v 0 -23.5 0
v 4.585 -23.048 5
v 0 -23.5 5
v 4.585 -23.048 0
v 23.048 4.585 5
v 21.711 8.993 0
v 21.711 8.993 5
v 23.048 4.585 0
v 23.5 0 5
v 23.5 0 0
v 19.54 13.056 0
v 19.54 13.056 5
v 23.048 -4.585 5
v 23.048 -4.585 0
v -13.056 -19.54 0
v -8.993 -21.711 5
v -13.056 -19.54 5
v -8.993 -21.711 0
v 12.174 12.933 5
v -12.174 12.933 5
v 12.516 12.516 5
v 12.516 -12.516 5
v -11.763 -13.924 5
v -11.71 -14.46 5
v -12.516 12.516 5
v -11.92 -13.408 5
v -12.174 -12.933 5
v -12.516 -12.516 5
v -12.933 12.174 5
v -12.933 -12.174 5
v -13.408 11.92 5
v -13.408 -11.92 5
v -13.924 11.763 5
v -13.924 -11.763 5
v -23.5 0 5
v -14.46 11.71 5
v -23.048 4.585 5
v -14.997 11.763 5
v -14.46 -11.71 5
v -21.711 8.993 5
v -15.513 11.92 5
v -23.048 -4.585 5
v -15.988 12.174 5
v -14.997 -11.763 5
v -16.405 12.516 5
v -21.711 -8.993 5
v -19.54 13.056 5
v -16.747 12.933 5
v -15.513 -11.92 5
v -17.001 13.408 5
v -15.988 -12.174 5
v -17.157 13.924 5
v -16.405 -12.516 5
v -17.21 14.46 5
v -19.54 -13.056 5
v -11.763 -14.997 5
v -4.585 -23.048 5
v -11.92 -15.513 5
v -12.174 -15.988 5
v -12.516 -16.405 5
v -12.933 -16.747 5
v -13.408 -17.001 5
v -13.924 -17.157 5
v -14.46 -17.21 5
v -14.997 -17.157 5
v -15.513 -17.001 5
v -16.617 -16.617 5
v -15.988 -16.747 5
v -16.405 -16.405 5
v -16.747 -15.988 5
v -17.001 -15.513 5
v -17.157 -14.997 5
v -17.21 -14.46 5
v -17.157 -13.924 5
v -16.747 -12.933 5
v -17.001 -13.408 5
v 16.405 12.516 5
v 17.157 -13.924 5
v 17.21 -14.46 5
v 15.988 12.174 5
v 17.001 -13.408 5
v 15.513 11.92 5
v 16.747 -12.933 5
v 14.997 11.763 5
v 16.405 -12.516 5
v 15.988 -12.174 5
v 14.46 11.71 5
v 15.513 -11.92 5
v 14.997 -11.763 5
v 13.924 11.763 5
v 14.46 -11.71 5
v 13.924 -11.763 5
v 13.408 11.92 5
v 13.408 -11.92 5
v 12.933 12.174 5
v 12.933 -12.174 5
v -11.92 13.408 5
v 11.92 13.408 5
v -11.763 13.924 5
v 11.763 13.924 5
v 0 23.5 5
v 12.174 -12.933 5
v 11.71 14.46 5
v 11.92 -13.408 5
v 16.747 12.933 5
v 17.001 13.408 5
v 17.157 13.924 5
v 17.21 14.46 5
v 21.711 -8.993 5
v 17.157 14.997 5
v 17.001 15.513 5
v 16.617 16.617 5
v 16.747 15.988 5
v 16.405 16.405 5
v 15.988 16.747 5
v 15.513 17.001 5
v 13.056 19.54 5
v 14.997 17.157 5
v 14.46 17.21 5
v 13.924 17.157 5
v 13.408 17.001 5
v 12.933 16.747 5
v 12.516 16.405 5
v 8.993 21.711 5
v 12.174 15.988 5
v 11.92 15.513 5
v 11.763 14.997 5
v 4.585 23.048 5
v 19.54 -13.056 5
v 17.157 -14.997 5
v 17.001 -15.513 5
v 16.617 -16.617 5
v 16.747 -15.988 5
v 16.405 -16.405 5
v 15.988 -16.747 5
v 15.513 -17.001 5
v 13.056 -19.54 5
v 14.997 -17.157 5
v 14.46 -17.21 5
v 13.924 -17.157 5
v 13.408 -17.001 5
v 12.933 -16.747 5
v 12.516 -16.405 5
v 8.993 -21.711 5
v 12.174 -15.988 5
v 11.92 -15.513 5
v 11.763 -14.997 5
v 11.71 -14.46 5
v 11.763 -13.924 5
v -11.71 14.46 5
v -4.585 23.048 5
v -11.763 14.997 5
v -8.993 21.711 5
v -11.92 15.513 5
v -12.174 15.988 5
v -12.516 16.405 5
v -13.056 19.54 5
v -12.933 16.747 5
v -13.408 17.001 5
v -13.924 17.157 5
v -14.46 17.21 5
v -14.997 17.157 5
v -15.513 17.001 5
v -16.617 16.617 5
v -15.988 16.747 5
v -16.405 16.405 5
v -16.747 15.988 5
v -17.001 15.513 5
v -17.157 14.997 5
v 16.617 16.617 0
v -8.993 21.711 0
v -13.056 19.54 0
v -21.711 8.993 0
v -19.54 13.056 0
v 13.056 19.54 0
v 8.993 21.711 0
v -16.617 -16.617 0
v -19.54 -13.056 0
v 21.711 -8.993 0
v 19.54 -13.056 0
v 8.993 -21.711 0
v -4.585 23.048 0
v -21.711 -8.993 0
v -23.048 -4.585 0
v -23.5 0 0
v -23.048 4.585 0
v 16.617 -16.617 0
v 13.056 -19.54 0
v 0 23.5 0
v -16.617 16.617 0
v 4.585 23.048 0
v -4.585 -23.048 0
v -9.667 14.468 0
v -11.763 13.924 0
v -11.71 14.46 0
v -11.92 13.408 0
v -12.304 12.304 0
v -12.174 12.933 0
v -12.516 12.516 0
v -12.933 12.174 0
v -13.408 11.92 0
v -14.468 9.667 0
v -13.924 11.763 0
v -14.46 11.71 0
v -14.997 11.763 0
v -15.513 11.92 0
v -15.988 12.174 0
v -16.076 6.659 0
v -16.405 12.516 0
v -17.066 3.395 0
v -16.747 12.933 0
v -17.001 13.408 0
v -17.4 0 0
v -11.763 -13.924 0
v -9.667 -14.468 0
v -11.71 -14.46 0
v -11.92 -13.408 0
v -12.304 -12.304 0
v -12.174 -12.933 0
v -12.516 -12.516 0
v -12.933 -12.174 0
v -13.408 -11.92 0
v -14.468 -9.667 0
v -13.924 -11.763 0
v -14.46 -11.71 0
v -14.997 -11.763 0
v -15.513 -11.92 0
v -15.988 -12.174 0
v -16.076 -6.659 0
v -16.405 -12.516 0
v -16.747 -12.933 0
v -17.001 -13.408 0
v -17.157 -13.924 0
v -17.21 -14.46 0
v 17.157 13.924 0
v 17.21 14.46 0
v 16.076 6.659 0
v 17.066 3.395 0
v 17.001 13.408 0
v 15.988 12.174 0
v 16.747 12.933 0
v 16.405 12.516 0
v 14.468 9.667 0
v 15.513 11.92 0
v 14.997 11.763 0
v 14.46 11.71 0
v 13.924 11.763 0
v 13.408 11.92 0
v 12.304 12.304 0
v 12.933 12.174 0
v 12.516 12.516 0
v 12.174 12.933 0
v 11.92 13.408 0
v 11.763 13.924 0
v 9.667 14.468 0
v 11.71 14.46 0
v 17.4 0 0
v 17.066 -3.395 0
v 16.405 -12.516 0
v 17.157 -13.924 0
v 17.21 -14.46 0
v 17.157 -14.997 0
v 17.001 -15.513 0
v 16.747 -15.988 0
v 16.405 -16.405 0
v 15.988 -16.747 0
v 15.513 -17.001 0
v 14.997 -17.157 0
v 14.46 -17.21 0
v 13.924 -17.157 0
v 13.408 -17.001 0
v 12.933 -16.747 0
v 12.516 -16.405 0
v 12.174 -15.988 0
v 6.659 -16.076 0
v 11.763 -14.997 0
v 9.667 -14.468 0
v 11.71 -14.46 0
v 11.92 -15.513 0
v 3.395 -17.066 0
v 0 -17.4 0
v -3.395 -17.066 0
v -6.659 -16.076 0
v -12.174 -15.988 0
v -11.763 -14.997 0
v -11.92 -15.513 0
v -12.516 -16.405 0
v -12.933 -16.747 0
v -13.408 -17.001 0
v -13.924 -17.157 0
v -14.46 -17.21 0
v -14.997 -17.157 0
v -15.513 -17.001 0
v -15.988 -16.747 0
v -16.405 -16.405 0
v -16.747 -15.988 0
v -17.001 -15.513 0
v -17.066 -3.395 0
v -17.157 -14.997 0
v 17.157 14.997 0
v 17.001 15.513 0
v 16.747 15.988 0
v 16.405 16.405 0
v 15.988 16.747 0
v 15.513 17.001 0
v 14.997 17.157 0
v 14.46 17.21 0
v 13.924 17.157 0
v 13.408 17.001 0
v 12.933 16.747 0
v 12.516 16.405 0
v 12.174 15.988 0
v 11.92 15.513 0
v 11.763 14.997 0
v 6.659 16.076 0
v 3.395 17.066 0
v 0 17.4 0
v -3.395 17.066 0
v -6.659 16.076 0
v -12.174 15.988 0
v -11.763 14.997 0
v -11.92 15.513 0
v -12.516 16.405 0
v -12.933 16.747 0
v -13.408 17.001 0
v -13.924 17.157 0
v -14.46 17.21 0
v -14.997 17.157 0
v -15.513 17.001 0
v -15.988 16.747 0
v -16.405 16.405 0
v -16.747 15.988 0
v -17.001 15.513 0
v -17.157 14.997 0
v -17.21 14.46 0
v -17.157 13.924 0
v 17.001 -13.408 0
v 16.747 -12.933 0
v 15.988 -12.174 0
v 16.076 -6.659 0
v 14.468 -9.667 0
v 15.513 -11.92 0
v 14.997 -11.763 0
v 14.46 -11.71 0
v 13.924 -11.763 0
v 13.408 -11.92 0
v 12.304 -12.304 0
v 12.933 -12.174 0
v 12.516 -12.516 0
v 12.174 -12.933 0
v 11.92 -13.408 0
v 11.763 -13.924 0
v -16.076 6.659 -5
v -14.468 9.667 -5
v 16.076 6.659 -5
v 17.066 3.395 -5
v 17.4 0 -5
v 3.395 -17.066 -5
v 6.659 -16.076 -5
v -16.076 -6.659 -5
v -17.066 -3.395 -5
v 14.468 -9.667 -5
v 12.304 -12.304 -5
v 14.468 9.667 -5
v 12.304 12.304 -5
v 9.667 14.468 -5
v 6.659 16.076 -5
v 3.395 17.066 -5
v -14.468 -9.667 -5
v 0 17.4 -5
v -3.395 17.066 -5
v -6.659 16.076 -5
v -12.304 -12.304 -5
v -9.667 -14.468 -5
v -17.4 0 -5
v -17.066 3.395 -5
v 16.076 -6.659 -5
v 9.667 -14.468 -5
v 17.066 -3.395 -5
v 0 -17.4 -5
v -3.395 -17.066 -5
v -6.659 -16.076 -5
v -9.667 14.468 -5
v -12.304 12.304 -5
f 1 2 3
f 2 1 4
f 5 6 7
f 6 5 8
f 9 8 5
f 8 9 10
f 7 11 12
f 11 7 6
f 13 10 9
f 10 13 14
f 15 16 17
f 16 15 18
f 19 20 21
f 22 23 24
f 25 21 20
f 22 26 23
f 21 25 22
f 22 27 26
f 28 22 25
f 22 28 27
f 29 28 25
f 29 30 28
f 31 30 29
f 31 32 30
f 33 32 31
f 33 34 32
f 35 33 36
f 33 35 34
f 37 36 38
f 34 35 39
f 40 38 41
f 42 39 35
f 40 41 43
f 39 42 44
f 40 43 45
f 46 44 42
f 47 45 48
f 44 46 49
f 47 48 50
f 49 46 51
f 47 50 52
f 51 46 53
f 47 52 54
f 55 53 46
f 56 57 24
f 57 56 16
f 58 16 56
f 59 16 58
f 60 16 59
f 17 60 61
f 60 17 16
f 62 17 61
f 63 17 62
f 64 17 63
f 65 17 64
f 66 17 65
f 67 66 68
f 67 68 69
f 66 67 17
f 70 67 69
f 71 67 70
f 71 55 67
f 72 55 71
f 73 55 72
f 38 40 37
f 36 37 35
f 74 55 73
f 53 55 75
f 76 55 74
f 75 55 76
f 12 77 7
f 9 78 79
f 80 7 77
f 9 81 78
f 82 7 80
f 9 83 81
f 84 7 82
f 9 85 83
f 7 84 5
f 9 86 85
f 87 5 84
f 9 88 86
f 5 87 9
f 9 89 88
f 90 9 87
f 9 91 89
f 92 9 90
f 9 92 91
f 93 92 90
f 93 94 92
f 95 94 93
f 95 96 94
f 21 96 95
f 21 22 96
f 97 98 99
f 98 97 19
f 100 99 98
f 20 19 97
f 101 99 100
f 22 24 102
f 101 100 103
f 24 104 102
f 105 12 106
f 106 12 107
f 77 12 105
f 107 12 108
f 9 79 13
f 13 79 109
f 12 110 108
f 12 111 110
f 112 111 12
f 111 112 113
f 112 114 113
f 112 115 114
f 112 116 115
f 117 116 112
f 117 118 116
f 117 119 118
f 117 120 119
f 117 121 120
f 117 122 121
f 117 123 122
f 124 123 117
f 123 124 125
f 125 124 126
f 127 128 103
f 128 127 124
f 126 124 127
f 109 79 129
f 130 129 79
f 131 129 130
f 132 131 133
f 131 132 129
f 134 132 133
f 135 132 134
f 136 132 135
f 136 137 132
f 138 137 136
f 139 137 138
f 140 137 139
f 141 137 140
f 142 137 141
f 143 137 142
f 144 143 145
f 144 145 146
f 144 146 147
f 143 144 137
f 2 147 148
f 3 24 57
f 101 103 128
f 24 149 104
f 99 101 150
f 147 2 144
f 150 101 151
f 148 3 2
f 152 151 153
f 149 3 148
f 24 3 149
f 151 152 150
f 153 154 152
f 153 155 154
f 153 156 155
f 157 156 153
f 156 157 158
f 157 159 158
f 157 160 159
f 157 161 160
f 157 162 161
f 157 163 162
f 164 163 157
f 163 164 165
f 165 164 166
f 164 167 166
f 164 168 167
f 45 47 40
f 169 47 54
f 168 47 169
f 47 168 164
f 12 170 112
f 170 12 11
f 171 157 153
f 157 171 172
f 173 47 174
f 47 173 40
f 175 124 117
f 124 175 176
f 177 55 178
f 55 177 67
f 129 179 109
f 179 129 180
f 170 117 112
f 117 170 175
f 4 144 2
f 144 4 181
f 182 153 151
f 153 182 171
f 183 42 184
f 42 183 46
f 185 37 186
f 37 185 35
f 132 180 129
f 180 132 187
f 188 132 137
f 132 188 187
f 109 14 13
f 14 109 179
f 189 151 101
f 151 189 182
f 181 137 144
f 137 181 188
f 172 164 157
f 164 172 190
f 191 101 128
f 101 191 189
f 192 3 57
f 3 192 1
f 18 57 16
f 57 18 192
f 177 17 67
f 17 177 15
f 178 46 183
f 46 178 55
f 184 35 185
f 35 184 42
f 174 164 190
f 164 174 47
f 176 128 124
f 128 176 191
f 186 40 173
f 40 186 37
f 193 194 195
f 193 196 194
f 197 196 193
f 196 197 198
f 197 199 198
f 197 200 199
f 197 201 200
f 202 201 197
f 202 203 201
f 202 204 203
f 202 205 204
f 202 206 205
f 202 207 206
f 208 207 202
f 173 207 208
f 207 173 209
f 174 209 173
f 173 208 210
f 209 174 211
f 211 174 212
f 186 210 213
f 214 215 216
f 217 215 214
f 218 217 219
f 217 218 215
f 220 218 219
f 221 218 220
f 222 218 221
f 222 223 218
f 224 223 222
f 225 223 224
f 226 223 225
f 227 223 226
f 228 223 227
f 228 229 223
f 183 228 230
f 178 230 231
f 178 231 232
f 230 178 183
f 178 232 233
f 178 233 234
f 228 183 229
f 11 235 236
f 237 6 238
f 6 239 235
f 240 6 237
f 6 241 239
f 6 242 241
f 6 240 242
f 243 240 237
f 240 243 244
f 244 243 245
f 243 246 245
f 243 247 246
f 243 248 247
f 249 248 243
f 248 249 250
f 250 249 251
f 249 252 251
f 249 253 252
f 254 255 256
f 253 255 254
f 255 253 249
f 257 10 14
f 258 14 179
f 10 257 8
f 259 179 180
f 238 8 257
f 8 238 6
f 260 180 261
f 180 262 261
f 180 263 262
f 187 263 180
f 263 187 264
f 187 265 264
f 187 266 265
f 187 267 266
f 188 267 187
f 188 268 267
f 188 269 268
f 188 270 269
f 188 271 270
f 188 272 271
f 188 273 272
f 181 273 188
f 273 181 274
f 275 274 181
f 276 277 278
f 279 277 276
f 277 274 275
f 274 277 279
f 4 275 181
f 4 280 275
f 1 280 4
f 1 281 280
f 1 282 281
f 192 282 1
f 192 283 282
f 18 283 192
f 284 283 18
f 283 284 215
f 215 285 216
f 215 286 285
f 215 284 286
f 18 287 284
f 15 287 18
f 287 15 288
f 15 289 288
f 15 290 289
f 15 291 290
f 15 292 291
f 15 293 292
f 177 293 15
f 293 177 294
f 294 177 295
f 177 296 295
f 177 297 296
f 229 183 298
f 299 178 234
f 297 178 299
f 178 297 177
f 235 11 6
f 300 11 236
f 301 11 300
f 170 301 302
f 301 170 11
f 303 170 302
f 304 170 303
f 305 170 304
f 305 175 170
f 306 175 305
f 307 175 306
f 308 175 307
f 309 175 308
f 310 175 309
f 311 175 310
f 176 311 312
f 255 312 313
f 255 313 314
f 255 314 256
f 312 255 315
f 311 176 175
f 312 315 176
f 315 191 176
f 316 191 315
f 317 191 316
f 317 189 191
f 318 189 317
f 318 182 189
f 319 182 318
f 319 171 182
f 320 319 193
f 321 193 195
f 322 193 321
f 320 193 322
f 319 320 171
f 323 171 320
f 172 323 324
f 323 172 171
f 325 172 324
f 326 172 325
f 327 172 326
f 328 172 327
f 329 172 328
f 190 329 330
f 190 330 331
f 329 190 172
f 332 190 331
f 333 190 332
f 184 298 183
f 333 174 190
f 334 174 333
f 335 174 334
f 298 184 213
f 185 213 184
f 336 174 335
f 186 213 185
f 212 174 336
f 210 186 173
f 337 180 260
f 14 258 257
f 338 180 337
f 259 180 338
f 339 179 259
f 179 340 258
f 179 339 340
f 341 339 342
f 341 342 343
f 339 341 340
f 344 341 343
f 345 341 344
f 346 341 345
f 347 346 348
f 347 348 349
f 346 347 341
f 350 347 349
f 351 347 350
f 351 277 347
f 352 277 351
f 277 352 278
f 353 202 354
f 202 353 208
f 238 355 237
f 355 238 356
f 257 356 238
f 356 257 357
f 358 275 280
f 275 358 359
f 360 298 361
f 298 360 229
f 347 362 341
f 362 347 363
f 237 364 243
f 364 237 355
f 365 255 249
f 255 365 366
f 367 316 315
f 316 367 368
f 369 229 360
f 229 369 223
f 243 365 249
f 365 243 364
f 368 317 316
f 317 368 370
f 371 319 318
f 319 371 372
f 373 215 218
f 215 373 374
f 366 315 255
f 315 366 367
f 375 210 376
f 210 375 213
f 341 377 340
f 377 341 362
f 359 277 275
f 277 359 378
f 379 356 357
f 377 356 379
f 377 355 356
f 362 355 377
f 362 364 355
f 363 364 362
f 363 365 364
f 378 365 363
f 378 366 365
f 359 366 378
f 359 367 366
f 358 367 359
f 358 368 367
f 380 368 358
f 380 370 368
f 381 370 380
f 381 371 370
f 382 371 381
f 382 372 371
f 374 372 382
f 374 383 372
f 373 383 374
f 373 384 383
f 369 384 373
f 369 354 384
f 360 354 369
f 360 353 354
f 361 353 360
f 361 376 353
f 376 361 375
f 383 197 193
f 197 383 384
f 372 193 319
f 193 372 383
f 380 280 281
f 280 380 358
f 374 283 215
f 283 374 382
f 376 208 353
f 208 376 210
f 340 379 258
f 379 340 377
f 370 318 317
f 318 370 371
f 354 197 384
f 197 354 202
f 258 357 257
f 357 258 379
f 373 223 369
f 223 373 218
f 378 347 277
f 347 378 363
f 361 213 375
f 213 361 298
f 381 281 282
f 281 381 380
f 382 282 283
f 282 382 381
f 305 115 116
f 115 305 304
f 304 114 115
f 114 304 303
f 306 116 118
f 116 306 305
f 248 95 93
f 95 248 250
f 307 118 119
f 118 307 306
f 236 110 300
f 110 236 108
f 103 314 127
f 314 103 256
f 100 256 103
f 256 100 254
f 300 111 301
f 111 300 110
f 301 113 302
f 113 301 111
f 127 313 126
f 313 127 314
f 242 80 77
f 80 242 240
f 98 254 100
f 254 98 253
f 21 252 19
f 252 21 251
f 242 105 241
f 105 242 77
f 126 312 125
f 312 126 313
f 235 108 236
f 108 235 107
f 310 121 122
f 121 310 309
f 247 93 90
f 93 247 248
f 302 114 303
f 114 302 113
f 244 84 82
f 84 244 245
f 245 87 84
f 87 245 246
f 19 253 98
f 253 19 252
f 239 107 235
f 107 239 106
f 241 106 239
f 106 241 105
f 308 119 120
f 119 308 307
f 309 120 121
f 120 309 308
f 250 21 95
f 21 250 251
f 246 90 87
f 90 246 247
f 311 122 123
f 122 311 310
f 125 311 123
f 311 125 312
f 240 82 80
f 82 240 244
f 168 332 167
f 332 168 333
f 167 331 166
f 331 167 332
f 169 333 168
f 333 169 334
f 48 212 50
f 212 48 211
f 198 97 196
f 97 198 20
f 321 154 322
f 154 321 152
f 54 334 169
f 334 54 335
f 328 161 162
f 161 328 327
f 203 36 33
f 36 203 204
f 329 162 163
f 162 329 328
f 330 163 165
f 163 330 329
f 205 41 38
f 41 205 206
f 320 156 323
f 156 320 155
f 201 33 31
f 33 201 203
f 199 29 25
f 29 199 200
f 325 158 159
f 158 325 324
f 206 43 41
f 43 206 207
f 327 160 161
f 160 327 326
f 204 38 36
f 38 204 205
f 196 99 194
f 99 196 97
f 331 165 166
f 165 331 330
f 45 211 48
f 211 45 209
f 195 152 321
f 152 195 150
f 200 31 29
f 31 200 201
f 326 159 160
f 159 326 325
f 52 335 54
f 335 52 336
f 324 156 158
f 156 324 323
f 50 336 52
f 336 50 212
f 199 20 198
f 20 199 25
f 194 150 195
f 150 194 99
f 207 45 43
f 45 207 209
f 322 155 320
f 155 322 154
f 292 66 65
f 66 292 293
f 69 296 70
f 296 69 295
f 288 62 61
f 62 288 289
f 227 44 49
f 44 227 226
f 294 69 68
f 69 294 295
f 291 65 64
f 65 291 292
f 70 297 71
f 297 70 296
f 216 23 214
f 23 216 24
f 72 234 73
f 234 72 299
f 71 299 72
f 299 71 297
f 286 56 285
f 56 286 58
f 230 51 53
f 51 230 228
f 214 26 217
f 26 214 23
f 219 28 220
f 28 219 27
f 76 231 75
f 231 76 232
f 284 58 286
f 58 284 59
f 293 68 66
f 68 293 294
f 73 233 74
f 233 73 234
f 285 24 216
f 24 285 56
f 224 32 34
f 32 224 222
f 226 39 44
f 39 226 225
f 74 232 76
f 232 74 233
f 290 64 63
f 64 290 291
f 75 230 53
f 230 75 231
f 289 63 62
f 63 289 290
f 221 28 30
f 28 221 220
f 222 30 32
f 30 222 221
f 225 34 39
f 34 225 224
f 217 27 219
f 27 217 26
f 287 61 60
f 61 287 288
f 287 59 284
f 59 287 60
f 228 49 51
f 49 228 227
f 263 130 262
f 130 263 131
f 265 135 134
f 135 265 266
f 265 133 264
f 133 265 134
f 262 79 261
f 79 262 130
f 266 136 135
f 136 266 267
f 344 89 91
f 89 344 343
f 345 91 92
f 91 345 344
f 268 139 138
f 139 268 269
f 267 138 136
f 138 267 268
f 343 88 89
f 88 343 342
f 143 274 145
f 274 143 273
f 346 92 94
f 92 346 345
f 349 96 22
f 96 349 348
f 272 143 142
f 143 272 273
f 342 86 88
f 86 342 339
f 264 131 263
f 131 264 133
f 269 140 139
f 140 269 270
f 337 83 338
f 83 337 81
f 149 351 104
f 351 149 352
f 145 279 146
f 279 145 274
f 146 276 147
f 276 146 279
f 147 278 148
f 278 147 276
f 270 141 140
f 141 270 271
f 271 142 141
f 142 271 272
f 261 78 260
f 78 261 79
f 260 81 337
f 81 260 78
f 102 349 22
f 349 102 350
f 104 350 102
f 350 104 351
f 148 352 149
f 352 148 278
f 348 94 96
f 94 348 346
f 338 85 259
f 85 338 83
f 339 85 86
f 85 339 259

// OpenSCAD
$fn = 32;

// ----------------------------------------------------------------------
// Retaining cap: 6202 cover, 47 mm, spigot 34.8 mm
// ----------------------------------------------------------------------

// --- parameters (mm) ---
plate_d = 47;             // cover diameter
plate_t = 5;              // cover thickness
boss_d = 34.8;            // spigot that enters the housing
boss_h = 5;               // spigot height
bolt_d = 5.5;             // bolt clearance
bolt_r = 20.45;           // bolt circle radius

module cover() {
  cylinder(h = plate_t, d = plate_d);
}

module spigot() {
  /* sunk 1 mm into the cover; the spigot sets the overall height */
  translate([0, 0, -boss_h]) cylinder(h = boss_h + 1, d = boss_d);
}

difference() {
  union() {
    cover();
    spigot();
  }
  for (i = [0 : 3]) rotate([0, 0, 45 + i * 90]) translate([bolt_r, 0, -boss_h - 1])
    cylinder(h = boss_h + plate_t + 2, d = bolt_d);
}
